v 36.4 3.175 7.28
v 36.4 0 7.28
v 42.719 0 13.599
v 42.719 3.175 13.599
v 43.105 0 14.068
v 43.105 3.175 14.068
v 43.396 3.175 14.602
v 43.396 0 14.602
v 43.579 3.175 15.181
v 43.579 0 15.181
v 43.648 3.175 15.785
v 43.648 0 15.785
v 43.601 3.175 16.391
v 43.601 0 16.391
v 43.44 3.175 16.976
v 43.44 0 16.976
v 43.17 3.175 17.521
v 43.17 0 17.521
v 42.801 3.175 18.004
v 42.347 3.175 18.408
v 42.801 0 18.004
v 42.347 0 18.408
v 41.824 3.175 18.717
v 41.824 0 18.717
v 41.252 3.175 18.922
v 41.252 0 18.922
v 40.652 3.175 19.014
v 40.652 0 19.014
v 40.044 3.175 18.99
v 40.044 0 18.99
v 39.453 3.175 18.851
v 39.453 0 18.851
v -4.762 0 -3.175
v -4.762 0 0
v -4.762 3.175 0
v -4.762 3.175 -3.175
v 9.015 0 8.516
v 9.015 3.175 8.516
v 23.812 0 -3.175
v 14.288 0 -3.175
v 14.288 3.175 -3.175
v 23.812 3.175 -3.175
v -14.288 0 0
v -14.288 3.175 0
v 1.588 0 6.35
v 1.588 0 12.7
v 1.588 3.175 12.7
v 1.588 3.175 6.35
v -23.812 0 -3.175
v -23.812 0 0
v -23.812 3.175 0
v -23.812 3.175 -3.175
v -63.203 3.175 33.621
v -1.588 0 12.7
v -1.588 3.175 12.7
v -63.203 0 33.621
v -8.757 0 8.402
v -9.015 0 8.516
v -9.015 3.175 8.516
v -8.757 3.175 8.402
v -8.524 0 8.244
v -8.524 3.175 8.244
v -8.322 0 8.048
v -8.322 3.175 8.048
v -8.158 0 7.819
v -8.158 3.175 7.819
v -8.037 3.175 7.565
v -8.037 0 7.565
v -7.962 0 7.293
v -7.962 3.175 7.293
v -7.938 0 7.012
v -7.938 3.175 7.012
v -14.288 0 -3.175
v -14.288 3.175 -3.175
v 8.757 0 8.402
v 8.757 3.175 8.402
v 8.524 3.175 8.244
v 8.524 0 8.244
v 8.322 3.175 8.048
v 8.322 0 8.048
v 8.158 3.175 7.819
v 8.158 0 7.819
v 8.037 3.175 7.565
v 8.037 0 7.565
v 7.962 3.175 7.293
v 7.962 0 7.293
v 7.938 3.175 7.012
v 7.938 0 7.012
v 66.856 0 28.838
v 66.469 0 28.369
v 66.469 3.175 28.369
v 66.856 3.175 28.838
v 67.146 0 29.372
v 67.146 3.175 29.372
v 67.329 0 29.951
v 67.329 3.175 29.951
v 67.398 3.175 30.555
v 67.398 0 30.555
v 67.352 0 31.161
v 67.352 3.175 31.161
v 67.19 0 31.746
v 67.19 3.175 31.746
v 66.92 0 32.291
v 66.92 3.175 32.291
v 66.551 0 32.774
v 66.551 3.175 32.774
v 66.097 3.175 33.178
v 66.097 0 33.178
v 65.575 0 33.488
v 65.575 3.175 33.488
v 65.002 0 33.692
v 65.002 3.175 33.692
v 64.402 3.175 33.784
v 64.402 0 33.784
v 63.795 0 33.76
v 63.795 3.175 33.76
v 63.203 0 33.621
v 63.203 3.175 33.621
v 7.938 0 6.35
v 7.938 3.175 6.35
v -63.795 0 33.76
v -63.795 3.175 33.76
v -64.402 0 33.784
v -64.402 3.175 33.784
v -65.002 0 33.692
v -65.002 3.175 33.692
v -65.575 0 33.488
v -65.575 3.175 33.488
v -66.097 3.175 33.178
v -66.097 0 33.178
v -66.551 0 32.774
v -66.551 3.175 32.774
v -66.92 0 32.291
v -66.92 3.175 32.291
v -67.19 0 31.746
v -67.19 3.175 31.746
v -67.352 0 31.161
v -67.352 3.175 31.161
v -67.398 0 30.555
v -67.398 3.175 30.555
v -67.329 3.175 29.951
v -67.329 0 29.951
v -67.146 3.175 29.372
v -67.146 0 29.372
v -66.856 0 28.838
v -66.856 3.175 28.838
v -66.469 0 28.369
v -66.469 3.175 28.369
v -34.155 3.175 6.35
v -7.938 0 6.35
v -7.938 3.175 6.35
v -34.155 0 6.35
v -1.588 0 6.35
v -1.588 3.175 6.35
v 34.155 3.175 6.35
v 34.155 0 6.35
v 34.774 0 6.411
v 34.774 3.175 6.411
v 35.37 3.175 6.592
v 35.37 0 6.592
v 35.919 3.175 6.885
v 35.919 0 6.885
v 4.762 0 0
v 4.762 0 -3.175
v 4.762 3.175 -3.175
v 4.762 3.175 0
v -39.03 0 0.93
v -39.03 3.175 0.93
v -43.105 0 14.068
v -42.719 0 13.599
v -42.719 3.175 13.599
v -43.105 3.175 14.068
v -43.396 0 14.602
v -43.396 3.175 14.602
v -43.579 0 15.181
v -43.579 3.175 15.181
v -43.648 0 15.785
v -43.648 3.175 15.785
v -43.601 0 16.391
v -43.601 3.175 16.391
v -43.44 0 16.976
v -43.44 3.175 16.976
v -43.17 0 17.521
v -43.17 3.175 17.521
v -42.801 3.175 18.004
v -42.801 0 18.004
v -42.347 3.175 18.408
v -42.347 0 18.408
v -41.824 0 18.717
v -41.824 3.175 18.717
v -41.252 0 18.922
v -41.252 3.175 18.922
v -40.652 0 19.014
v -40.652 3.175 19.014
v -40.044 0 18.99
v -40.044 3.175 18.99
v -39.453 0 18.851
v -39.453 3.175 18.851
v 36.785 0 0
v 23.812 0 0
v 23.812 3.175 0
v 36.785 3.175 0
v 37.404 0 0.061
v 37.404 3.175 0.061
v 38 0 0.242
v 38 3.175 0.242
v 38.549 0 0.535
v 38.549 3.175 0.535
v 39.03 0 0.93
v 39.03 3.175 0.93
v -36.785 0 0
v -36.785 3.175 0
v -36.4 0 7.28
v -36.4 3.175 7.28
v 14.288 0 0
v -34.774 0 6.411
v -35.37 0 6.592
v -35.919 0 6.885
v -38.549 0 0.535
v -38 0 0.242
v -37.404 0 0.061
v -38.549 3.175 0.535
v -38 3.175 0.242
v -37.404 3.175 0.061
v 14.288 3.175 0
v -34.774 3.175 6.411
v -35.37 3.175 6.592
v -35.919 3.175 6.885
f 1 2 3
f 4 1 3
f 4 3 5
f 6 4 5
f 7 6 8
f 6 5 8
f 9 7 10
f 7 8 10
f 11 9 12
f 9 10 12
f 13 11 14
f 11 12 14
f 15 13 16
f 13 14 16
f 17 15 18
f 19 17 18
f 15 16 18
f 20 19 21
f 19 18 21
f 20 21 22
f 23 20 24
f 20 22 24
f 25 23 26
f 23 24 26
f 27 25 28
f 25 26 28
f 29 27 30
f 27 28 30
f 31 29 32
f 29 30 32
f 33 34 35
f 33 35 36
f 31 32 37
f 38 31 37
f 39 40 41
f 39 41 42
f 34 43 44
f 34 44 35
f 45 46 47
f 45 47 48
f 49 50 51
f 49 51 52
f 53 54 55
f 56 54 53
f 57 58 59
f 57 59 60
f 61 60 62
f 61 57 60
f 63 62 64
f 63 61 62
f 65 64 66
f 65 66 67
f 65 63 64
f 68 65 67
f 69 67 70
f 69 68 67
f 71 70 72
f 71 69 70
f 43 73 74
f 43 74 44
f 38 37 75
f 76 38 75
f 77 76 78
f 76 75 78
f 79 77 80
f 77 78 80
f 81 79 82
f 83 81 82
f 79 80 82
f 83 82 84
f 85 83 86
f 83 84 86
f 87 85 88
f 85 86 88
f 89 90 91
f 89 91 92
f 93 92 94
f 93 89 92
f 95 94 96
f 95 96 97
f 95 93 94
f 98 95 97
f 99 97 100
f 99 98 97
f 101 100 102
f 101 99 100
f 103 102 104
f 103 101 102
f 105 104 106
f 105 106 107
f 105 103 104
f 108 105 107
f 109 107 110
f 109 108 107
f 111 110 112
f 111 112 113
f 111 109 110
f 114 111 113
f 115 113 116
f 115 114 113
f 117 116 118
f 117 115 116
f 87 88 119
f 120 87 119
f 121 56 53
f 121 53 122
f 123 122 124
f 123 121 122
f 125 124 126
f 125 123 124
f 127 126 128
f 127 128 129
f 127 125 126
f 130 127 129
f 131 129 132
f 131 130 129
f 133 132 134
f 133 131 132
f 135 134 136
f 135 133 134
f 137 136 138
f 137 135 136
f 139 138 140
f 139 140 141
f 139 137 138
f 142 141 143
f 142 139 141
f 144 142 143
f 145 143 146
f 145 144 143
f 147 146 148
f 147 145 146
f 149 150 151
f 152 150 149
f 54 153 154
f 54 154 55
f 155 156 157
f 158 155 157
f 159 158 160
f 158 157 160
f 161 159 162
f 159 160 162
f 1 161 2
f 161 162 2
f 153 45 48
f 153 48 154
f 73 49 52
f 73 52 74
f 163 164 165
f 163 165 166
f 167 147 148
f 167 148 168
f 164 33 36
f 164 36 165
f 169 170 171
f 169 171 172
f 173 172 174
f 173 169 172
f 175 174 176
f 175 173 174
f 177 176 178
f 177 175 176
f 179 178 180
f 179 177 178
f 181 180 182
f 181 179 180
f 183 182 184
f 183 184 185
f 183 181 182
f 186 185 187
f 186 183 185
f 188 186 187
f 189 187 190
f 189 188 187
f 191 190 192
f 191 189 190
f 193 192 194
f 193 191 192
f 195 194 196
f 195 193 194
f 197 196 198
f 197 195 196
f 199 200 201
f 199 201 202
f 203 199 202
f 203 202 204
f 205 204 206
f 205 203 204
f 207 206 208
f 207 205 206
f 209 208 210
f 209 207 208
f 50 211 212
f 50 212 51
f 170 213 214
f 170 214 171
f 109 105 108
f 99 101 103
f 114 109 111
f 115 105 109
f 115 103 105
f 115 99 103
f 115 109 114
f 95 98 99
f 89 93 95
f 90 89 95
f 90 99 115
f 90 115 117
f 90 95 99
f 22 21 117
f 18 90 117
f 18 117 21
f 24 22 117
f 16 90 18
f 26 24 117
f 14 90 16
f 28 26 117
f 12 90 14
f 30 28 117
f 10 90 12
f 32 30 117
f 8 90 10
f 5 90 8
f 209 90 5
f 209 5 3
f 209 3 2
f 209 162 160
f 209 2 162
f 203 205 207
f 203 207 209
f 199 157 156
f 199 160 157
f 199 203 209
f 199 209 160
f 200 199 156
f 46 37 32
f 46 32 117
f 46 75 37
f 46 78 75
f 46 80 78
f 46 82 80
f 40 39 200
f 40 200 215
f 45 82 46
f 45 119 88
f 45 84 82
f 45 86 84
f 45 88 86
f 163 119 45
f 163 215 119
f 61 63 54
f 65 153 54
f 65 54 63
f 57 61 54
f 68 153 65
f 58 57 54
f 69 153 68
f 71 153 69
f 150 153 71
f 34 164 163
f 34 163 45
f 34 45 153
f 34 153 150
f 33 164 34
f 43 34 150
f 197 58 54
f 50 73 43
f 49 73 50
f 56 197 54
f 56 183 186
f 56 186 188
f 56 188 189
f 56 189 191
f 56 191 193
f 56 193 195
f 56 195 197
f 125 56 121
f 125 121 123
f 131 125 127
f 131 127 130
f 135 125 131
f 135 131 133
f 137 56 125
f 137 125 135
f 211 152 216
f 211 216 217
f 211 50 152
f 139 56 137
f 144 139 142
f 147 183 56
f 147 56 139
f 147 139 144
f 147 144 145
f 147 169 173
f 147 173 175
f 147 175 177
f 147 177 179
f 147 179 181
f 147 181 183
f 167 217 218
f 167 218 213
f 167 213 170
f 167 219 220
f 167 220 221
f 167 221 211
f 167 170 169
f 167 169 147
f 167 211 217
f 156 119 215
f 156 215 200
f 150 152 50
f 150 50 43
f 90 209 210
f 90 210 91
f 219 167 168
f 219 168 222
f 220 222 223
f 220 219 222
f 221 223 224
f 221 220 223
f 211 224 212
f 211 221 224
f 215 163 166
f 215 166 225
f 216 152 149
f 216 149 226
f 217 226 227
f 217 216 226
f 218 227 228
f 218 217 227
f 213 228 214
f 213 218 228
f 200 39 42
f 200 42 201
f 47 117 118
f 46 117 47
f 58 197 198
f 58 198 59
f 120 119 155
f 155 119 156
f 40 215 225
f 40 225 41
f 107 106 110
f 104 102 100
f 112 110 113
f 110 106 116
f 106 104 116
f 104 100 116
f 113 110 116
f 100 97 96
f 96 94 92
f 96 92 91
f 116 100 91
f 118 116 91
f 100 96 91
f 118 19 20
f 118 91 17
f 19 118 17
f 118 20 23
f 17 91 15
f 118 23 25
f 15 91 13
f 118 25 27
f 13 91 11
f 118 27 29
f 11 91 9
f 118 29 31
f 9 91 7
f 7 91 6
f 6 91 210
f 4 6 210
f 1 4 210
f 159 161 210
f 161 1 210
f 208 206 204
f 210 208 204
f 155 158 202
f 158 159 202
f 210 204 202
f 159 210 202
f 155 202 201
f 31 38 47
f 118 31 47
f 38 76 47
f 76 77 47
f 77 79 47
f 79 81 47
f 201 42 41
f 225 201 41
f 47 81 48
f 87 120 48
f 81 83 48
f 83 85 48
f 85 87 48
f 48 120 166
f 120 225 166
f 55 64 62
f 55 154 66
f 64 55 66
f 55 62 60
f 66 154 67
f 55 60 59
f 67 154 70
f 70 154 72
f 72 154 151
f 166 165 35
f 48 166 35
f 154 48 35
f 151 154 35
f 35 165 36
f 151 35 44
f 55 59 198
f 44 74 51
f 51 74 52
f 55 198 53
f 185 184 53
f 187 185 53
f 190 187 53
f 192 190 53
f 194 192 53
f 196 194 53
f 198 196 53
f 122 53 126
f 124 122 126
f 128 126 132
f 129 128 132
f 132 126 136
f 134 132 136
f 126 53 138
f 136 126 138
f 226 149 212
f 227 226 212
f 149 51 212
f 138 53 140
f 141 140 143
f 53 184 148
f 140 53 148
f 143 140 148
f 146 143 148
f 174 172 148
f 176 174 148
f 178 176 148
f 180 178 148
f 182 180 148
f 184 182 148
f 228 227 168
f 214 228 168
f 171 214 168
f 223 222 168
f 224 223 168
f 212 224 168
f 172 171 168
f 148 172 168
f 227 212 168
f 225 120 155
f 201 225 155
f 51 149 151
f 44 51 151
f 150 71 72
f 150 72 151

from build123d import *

# Parameters (mm, degrees)
BOSS_EXTRUDE1_DEPTH = 3.175


with BuildPart() as part:
    # Sketch1 → Boss-Extrude1 (new body)
    with BuildSketch(Plane(origin=(0, 0, 0), x_dir=(1, 0, 0), z_dir=(0, 1, 0))):
        with BuildLine():
            Line((-36.784871939, 0), (-23.8125, 0))
            Line((-23.8125, 0), (-23.8125, 3.175))
            Line((-23.8125, 3.175), (-14.2875, 3.175))
            Line((-14.2875, 3.175), (-14.2875, 0))
            Line((-14.2875, 0), (-4.7625, 0))
            Line((-4.7625, 0), (-4.7625, 3.175))
            Line((-4.7625, 3.175), (4.7625, 3.175))
            Line((4.7625, 3.175), (4.7625, 0))
            Line((4.7625, 0), (14.2875, 0))
            Line((14.2875, 0), (14.2875, 3.175))
            Line((14.2875, 3.175), (23.8125, 3.175))
            Line((23.8125, 3.175), (23.8125, 0))
            Line((23.8125, 0), (36.784871939, 0))
            ThreePointArc((36.784871939, 0), (37.999891837, -0.241682484), (39.02993597, -0.92993597))
            Line((39.02993597, -0.92993597), (66.469065694, -28.369065694))
            ThreePointArc((66.469065694, -28.369065694), (66.920159512, -32.290840151), (63.203219493, -33.620560958))
            Line((63.203219493, -33.620560958), (1.5875, -12.7))
            Line((1.5875, -12.7), (1.5875, -6.35))
            Line((1.5875, -6.35), (-1.5875, -6.35))
            Line((-1.5875, -6.35), (-1.5875, -12.7))
            Line((-1.5875, -12.7), (-63.203219493, -33.620560958))
            ThreePointArc((-63.203219493, -33.620560958), (-66.920159512, -32.290840151), (-66.469065694, -28.369065694))
            Line((-66.469065694, -28.369065694), (-39.02993597, -0.92993597))
            ThreePointArc((-39.02993597, -0.92993597), (-37.999891837, -0.241682484), (-36.784871939, 0))
        make_face()
        with BuildLine():
            Line((-39.452913677, -18.850511262), (-9.014608915, -8.515706841))
            ThreePointArc((-9.014608915, -8.515706841), (-8.234573307, -7.9371291), (-7.9375, -7.012491225))
            Line((-7.9375, -7.012491225), (-7.9375, -6.35))
            Line((-7.9375, -6.35), (-34.154615818, -6.35))
            ThreePointArc((-34.154615818, -6.35), (-35.369635716, -6.591682484), (-36.399679849, -7.27993597))
            Line((-36.399679849, -7.27993597), (-42.718759878, -13.599015999))
            ThreePointArc((-42.718759878, -13.599015999), (-43.169853696, -17.520790456), (-39.452913677, -18.850511262))
        make_face(mode=Mode.SUBTRACT)
        with BuildLine():
            Line((39.452913677, -18.850511262), (9.014608915, -8.515706841))
            ThreePointArc((9.014608915, -8.515706841), (8.234573307, -7.9371291), (7.9375, -7.012491225))
            Line((7.9375, -7.012491225), (7.9375, -6.35))
            Line((7.9375, -6.35), (34.154615818, -6.35))
            ThreePointArc((34.154615818, -6.35), (35.369635716, -6.591682484), (36.399679849, -7.27993597))
            Line((36.399679849, -7.27993597), (42.718759878, -13.599015999))
            ThreePointArc((42.718759878, -13.599015999), (43.169853696, -17.520790456), (39.452913677, -18.850511262))
        make_face(mode=Mode.SUBTRACT)
    extrude(amount=BOSS_EXTRUDE1_DEPTH)


solid = part.part
